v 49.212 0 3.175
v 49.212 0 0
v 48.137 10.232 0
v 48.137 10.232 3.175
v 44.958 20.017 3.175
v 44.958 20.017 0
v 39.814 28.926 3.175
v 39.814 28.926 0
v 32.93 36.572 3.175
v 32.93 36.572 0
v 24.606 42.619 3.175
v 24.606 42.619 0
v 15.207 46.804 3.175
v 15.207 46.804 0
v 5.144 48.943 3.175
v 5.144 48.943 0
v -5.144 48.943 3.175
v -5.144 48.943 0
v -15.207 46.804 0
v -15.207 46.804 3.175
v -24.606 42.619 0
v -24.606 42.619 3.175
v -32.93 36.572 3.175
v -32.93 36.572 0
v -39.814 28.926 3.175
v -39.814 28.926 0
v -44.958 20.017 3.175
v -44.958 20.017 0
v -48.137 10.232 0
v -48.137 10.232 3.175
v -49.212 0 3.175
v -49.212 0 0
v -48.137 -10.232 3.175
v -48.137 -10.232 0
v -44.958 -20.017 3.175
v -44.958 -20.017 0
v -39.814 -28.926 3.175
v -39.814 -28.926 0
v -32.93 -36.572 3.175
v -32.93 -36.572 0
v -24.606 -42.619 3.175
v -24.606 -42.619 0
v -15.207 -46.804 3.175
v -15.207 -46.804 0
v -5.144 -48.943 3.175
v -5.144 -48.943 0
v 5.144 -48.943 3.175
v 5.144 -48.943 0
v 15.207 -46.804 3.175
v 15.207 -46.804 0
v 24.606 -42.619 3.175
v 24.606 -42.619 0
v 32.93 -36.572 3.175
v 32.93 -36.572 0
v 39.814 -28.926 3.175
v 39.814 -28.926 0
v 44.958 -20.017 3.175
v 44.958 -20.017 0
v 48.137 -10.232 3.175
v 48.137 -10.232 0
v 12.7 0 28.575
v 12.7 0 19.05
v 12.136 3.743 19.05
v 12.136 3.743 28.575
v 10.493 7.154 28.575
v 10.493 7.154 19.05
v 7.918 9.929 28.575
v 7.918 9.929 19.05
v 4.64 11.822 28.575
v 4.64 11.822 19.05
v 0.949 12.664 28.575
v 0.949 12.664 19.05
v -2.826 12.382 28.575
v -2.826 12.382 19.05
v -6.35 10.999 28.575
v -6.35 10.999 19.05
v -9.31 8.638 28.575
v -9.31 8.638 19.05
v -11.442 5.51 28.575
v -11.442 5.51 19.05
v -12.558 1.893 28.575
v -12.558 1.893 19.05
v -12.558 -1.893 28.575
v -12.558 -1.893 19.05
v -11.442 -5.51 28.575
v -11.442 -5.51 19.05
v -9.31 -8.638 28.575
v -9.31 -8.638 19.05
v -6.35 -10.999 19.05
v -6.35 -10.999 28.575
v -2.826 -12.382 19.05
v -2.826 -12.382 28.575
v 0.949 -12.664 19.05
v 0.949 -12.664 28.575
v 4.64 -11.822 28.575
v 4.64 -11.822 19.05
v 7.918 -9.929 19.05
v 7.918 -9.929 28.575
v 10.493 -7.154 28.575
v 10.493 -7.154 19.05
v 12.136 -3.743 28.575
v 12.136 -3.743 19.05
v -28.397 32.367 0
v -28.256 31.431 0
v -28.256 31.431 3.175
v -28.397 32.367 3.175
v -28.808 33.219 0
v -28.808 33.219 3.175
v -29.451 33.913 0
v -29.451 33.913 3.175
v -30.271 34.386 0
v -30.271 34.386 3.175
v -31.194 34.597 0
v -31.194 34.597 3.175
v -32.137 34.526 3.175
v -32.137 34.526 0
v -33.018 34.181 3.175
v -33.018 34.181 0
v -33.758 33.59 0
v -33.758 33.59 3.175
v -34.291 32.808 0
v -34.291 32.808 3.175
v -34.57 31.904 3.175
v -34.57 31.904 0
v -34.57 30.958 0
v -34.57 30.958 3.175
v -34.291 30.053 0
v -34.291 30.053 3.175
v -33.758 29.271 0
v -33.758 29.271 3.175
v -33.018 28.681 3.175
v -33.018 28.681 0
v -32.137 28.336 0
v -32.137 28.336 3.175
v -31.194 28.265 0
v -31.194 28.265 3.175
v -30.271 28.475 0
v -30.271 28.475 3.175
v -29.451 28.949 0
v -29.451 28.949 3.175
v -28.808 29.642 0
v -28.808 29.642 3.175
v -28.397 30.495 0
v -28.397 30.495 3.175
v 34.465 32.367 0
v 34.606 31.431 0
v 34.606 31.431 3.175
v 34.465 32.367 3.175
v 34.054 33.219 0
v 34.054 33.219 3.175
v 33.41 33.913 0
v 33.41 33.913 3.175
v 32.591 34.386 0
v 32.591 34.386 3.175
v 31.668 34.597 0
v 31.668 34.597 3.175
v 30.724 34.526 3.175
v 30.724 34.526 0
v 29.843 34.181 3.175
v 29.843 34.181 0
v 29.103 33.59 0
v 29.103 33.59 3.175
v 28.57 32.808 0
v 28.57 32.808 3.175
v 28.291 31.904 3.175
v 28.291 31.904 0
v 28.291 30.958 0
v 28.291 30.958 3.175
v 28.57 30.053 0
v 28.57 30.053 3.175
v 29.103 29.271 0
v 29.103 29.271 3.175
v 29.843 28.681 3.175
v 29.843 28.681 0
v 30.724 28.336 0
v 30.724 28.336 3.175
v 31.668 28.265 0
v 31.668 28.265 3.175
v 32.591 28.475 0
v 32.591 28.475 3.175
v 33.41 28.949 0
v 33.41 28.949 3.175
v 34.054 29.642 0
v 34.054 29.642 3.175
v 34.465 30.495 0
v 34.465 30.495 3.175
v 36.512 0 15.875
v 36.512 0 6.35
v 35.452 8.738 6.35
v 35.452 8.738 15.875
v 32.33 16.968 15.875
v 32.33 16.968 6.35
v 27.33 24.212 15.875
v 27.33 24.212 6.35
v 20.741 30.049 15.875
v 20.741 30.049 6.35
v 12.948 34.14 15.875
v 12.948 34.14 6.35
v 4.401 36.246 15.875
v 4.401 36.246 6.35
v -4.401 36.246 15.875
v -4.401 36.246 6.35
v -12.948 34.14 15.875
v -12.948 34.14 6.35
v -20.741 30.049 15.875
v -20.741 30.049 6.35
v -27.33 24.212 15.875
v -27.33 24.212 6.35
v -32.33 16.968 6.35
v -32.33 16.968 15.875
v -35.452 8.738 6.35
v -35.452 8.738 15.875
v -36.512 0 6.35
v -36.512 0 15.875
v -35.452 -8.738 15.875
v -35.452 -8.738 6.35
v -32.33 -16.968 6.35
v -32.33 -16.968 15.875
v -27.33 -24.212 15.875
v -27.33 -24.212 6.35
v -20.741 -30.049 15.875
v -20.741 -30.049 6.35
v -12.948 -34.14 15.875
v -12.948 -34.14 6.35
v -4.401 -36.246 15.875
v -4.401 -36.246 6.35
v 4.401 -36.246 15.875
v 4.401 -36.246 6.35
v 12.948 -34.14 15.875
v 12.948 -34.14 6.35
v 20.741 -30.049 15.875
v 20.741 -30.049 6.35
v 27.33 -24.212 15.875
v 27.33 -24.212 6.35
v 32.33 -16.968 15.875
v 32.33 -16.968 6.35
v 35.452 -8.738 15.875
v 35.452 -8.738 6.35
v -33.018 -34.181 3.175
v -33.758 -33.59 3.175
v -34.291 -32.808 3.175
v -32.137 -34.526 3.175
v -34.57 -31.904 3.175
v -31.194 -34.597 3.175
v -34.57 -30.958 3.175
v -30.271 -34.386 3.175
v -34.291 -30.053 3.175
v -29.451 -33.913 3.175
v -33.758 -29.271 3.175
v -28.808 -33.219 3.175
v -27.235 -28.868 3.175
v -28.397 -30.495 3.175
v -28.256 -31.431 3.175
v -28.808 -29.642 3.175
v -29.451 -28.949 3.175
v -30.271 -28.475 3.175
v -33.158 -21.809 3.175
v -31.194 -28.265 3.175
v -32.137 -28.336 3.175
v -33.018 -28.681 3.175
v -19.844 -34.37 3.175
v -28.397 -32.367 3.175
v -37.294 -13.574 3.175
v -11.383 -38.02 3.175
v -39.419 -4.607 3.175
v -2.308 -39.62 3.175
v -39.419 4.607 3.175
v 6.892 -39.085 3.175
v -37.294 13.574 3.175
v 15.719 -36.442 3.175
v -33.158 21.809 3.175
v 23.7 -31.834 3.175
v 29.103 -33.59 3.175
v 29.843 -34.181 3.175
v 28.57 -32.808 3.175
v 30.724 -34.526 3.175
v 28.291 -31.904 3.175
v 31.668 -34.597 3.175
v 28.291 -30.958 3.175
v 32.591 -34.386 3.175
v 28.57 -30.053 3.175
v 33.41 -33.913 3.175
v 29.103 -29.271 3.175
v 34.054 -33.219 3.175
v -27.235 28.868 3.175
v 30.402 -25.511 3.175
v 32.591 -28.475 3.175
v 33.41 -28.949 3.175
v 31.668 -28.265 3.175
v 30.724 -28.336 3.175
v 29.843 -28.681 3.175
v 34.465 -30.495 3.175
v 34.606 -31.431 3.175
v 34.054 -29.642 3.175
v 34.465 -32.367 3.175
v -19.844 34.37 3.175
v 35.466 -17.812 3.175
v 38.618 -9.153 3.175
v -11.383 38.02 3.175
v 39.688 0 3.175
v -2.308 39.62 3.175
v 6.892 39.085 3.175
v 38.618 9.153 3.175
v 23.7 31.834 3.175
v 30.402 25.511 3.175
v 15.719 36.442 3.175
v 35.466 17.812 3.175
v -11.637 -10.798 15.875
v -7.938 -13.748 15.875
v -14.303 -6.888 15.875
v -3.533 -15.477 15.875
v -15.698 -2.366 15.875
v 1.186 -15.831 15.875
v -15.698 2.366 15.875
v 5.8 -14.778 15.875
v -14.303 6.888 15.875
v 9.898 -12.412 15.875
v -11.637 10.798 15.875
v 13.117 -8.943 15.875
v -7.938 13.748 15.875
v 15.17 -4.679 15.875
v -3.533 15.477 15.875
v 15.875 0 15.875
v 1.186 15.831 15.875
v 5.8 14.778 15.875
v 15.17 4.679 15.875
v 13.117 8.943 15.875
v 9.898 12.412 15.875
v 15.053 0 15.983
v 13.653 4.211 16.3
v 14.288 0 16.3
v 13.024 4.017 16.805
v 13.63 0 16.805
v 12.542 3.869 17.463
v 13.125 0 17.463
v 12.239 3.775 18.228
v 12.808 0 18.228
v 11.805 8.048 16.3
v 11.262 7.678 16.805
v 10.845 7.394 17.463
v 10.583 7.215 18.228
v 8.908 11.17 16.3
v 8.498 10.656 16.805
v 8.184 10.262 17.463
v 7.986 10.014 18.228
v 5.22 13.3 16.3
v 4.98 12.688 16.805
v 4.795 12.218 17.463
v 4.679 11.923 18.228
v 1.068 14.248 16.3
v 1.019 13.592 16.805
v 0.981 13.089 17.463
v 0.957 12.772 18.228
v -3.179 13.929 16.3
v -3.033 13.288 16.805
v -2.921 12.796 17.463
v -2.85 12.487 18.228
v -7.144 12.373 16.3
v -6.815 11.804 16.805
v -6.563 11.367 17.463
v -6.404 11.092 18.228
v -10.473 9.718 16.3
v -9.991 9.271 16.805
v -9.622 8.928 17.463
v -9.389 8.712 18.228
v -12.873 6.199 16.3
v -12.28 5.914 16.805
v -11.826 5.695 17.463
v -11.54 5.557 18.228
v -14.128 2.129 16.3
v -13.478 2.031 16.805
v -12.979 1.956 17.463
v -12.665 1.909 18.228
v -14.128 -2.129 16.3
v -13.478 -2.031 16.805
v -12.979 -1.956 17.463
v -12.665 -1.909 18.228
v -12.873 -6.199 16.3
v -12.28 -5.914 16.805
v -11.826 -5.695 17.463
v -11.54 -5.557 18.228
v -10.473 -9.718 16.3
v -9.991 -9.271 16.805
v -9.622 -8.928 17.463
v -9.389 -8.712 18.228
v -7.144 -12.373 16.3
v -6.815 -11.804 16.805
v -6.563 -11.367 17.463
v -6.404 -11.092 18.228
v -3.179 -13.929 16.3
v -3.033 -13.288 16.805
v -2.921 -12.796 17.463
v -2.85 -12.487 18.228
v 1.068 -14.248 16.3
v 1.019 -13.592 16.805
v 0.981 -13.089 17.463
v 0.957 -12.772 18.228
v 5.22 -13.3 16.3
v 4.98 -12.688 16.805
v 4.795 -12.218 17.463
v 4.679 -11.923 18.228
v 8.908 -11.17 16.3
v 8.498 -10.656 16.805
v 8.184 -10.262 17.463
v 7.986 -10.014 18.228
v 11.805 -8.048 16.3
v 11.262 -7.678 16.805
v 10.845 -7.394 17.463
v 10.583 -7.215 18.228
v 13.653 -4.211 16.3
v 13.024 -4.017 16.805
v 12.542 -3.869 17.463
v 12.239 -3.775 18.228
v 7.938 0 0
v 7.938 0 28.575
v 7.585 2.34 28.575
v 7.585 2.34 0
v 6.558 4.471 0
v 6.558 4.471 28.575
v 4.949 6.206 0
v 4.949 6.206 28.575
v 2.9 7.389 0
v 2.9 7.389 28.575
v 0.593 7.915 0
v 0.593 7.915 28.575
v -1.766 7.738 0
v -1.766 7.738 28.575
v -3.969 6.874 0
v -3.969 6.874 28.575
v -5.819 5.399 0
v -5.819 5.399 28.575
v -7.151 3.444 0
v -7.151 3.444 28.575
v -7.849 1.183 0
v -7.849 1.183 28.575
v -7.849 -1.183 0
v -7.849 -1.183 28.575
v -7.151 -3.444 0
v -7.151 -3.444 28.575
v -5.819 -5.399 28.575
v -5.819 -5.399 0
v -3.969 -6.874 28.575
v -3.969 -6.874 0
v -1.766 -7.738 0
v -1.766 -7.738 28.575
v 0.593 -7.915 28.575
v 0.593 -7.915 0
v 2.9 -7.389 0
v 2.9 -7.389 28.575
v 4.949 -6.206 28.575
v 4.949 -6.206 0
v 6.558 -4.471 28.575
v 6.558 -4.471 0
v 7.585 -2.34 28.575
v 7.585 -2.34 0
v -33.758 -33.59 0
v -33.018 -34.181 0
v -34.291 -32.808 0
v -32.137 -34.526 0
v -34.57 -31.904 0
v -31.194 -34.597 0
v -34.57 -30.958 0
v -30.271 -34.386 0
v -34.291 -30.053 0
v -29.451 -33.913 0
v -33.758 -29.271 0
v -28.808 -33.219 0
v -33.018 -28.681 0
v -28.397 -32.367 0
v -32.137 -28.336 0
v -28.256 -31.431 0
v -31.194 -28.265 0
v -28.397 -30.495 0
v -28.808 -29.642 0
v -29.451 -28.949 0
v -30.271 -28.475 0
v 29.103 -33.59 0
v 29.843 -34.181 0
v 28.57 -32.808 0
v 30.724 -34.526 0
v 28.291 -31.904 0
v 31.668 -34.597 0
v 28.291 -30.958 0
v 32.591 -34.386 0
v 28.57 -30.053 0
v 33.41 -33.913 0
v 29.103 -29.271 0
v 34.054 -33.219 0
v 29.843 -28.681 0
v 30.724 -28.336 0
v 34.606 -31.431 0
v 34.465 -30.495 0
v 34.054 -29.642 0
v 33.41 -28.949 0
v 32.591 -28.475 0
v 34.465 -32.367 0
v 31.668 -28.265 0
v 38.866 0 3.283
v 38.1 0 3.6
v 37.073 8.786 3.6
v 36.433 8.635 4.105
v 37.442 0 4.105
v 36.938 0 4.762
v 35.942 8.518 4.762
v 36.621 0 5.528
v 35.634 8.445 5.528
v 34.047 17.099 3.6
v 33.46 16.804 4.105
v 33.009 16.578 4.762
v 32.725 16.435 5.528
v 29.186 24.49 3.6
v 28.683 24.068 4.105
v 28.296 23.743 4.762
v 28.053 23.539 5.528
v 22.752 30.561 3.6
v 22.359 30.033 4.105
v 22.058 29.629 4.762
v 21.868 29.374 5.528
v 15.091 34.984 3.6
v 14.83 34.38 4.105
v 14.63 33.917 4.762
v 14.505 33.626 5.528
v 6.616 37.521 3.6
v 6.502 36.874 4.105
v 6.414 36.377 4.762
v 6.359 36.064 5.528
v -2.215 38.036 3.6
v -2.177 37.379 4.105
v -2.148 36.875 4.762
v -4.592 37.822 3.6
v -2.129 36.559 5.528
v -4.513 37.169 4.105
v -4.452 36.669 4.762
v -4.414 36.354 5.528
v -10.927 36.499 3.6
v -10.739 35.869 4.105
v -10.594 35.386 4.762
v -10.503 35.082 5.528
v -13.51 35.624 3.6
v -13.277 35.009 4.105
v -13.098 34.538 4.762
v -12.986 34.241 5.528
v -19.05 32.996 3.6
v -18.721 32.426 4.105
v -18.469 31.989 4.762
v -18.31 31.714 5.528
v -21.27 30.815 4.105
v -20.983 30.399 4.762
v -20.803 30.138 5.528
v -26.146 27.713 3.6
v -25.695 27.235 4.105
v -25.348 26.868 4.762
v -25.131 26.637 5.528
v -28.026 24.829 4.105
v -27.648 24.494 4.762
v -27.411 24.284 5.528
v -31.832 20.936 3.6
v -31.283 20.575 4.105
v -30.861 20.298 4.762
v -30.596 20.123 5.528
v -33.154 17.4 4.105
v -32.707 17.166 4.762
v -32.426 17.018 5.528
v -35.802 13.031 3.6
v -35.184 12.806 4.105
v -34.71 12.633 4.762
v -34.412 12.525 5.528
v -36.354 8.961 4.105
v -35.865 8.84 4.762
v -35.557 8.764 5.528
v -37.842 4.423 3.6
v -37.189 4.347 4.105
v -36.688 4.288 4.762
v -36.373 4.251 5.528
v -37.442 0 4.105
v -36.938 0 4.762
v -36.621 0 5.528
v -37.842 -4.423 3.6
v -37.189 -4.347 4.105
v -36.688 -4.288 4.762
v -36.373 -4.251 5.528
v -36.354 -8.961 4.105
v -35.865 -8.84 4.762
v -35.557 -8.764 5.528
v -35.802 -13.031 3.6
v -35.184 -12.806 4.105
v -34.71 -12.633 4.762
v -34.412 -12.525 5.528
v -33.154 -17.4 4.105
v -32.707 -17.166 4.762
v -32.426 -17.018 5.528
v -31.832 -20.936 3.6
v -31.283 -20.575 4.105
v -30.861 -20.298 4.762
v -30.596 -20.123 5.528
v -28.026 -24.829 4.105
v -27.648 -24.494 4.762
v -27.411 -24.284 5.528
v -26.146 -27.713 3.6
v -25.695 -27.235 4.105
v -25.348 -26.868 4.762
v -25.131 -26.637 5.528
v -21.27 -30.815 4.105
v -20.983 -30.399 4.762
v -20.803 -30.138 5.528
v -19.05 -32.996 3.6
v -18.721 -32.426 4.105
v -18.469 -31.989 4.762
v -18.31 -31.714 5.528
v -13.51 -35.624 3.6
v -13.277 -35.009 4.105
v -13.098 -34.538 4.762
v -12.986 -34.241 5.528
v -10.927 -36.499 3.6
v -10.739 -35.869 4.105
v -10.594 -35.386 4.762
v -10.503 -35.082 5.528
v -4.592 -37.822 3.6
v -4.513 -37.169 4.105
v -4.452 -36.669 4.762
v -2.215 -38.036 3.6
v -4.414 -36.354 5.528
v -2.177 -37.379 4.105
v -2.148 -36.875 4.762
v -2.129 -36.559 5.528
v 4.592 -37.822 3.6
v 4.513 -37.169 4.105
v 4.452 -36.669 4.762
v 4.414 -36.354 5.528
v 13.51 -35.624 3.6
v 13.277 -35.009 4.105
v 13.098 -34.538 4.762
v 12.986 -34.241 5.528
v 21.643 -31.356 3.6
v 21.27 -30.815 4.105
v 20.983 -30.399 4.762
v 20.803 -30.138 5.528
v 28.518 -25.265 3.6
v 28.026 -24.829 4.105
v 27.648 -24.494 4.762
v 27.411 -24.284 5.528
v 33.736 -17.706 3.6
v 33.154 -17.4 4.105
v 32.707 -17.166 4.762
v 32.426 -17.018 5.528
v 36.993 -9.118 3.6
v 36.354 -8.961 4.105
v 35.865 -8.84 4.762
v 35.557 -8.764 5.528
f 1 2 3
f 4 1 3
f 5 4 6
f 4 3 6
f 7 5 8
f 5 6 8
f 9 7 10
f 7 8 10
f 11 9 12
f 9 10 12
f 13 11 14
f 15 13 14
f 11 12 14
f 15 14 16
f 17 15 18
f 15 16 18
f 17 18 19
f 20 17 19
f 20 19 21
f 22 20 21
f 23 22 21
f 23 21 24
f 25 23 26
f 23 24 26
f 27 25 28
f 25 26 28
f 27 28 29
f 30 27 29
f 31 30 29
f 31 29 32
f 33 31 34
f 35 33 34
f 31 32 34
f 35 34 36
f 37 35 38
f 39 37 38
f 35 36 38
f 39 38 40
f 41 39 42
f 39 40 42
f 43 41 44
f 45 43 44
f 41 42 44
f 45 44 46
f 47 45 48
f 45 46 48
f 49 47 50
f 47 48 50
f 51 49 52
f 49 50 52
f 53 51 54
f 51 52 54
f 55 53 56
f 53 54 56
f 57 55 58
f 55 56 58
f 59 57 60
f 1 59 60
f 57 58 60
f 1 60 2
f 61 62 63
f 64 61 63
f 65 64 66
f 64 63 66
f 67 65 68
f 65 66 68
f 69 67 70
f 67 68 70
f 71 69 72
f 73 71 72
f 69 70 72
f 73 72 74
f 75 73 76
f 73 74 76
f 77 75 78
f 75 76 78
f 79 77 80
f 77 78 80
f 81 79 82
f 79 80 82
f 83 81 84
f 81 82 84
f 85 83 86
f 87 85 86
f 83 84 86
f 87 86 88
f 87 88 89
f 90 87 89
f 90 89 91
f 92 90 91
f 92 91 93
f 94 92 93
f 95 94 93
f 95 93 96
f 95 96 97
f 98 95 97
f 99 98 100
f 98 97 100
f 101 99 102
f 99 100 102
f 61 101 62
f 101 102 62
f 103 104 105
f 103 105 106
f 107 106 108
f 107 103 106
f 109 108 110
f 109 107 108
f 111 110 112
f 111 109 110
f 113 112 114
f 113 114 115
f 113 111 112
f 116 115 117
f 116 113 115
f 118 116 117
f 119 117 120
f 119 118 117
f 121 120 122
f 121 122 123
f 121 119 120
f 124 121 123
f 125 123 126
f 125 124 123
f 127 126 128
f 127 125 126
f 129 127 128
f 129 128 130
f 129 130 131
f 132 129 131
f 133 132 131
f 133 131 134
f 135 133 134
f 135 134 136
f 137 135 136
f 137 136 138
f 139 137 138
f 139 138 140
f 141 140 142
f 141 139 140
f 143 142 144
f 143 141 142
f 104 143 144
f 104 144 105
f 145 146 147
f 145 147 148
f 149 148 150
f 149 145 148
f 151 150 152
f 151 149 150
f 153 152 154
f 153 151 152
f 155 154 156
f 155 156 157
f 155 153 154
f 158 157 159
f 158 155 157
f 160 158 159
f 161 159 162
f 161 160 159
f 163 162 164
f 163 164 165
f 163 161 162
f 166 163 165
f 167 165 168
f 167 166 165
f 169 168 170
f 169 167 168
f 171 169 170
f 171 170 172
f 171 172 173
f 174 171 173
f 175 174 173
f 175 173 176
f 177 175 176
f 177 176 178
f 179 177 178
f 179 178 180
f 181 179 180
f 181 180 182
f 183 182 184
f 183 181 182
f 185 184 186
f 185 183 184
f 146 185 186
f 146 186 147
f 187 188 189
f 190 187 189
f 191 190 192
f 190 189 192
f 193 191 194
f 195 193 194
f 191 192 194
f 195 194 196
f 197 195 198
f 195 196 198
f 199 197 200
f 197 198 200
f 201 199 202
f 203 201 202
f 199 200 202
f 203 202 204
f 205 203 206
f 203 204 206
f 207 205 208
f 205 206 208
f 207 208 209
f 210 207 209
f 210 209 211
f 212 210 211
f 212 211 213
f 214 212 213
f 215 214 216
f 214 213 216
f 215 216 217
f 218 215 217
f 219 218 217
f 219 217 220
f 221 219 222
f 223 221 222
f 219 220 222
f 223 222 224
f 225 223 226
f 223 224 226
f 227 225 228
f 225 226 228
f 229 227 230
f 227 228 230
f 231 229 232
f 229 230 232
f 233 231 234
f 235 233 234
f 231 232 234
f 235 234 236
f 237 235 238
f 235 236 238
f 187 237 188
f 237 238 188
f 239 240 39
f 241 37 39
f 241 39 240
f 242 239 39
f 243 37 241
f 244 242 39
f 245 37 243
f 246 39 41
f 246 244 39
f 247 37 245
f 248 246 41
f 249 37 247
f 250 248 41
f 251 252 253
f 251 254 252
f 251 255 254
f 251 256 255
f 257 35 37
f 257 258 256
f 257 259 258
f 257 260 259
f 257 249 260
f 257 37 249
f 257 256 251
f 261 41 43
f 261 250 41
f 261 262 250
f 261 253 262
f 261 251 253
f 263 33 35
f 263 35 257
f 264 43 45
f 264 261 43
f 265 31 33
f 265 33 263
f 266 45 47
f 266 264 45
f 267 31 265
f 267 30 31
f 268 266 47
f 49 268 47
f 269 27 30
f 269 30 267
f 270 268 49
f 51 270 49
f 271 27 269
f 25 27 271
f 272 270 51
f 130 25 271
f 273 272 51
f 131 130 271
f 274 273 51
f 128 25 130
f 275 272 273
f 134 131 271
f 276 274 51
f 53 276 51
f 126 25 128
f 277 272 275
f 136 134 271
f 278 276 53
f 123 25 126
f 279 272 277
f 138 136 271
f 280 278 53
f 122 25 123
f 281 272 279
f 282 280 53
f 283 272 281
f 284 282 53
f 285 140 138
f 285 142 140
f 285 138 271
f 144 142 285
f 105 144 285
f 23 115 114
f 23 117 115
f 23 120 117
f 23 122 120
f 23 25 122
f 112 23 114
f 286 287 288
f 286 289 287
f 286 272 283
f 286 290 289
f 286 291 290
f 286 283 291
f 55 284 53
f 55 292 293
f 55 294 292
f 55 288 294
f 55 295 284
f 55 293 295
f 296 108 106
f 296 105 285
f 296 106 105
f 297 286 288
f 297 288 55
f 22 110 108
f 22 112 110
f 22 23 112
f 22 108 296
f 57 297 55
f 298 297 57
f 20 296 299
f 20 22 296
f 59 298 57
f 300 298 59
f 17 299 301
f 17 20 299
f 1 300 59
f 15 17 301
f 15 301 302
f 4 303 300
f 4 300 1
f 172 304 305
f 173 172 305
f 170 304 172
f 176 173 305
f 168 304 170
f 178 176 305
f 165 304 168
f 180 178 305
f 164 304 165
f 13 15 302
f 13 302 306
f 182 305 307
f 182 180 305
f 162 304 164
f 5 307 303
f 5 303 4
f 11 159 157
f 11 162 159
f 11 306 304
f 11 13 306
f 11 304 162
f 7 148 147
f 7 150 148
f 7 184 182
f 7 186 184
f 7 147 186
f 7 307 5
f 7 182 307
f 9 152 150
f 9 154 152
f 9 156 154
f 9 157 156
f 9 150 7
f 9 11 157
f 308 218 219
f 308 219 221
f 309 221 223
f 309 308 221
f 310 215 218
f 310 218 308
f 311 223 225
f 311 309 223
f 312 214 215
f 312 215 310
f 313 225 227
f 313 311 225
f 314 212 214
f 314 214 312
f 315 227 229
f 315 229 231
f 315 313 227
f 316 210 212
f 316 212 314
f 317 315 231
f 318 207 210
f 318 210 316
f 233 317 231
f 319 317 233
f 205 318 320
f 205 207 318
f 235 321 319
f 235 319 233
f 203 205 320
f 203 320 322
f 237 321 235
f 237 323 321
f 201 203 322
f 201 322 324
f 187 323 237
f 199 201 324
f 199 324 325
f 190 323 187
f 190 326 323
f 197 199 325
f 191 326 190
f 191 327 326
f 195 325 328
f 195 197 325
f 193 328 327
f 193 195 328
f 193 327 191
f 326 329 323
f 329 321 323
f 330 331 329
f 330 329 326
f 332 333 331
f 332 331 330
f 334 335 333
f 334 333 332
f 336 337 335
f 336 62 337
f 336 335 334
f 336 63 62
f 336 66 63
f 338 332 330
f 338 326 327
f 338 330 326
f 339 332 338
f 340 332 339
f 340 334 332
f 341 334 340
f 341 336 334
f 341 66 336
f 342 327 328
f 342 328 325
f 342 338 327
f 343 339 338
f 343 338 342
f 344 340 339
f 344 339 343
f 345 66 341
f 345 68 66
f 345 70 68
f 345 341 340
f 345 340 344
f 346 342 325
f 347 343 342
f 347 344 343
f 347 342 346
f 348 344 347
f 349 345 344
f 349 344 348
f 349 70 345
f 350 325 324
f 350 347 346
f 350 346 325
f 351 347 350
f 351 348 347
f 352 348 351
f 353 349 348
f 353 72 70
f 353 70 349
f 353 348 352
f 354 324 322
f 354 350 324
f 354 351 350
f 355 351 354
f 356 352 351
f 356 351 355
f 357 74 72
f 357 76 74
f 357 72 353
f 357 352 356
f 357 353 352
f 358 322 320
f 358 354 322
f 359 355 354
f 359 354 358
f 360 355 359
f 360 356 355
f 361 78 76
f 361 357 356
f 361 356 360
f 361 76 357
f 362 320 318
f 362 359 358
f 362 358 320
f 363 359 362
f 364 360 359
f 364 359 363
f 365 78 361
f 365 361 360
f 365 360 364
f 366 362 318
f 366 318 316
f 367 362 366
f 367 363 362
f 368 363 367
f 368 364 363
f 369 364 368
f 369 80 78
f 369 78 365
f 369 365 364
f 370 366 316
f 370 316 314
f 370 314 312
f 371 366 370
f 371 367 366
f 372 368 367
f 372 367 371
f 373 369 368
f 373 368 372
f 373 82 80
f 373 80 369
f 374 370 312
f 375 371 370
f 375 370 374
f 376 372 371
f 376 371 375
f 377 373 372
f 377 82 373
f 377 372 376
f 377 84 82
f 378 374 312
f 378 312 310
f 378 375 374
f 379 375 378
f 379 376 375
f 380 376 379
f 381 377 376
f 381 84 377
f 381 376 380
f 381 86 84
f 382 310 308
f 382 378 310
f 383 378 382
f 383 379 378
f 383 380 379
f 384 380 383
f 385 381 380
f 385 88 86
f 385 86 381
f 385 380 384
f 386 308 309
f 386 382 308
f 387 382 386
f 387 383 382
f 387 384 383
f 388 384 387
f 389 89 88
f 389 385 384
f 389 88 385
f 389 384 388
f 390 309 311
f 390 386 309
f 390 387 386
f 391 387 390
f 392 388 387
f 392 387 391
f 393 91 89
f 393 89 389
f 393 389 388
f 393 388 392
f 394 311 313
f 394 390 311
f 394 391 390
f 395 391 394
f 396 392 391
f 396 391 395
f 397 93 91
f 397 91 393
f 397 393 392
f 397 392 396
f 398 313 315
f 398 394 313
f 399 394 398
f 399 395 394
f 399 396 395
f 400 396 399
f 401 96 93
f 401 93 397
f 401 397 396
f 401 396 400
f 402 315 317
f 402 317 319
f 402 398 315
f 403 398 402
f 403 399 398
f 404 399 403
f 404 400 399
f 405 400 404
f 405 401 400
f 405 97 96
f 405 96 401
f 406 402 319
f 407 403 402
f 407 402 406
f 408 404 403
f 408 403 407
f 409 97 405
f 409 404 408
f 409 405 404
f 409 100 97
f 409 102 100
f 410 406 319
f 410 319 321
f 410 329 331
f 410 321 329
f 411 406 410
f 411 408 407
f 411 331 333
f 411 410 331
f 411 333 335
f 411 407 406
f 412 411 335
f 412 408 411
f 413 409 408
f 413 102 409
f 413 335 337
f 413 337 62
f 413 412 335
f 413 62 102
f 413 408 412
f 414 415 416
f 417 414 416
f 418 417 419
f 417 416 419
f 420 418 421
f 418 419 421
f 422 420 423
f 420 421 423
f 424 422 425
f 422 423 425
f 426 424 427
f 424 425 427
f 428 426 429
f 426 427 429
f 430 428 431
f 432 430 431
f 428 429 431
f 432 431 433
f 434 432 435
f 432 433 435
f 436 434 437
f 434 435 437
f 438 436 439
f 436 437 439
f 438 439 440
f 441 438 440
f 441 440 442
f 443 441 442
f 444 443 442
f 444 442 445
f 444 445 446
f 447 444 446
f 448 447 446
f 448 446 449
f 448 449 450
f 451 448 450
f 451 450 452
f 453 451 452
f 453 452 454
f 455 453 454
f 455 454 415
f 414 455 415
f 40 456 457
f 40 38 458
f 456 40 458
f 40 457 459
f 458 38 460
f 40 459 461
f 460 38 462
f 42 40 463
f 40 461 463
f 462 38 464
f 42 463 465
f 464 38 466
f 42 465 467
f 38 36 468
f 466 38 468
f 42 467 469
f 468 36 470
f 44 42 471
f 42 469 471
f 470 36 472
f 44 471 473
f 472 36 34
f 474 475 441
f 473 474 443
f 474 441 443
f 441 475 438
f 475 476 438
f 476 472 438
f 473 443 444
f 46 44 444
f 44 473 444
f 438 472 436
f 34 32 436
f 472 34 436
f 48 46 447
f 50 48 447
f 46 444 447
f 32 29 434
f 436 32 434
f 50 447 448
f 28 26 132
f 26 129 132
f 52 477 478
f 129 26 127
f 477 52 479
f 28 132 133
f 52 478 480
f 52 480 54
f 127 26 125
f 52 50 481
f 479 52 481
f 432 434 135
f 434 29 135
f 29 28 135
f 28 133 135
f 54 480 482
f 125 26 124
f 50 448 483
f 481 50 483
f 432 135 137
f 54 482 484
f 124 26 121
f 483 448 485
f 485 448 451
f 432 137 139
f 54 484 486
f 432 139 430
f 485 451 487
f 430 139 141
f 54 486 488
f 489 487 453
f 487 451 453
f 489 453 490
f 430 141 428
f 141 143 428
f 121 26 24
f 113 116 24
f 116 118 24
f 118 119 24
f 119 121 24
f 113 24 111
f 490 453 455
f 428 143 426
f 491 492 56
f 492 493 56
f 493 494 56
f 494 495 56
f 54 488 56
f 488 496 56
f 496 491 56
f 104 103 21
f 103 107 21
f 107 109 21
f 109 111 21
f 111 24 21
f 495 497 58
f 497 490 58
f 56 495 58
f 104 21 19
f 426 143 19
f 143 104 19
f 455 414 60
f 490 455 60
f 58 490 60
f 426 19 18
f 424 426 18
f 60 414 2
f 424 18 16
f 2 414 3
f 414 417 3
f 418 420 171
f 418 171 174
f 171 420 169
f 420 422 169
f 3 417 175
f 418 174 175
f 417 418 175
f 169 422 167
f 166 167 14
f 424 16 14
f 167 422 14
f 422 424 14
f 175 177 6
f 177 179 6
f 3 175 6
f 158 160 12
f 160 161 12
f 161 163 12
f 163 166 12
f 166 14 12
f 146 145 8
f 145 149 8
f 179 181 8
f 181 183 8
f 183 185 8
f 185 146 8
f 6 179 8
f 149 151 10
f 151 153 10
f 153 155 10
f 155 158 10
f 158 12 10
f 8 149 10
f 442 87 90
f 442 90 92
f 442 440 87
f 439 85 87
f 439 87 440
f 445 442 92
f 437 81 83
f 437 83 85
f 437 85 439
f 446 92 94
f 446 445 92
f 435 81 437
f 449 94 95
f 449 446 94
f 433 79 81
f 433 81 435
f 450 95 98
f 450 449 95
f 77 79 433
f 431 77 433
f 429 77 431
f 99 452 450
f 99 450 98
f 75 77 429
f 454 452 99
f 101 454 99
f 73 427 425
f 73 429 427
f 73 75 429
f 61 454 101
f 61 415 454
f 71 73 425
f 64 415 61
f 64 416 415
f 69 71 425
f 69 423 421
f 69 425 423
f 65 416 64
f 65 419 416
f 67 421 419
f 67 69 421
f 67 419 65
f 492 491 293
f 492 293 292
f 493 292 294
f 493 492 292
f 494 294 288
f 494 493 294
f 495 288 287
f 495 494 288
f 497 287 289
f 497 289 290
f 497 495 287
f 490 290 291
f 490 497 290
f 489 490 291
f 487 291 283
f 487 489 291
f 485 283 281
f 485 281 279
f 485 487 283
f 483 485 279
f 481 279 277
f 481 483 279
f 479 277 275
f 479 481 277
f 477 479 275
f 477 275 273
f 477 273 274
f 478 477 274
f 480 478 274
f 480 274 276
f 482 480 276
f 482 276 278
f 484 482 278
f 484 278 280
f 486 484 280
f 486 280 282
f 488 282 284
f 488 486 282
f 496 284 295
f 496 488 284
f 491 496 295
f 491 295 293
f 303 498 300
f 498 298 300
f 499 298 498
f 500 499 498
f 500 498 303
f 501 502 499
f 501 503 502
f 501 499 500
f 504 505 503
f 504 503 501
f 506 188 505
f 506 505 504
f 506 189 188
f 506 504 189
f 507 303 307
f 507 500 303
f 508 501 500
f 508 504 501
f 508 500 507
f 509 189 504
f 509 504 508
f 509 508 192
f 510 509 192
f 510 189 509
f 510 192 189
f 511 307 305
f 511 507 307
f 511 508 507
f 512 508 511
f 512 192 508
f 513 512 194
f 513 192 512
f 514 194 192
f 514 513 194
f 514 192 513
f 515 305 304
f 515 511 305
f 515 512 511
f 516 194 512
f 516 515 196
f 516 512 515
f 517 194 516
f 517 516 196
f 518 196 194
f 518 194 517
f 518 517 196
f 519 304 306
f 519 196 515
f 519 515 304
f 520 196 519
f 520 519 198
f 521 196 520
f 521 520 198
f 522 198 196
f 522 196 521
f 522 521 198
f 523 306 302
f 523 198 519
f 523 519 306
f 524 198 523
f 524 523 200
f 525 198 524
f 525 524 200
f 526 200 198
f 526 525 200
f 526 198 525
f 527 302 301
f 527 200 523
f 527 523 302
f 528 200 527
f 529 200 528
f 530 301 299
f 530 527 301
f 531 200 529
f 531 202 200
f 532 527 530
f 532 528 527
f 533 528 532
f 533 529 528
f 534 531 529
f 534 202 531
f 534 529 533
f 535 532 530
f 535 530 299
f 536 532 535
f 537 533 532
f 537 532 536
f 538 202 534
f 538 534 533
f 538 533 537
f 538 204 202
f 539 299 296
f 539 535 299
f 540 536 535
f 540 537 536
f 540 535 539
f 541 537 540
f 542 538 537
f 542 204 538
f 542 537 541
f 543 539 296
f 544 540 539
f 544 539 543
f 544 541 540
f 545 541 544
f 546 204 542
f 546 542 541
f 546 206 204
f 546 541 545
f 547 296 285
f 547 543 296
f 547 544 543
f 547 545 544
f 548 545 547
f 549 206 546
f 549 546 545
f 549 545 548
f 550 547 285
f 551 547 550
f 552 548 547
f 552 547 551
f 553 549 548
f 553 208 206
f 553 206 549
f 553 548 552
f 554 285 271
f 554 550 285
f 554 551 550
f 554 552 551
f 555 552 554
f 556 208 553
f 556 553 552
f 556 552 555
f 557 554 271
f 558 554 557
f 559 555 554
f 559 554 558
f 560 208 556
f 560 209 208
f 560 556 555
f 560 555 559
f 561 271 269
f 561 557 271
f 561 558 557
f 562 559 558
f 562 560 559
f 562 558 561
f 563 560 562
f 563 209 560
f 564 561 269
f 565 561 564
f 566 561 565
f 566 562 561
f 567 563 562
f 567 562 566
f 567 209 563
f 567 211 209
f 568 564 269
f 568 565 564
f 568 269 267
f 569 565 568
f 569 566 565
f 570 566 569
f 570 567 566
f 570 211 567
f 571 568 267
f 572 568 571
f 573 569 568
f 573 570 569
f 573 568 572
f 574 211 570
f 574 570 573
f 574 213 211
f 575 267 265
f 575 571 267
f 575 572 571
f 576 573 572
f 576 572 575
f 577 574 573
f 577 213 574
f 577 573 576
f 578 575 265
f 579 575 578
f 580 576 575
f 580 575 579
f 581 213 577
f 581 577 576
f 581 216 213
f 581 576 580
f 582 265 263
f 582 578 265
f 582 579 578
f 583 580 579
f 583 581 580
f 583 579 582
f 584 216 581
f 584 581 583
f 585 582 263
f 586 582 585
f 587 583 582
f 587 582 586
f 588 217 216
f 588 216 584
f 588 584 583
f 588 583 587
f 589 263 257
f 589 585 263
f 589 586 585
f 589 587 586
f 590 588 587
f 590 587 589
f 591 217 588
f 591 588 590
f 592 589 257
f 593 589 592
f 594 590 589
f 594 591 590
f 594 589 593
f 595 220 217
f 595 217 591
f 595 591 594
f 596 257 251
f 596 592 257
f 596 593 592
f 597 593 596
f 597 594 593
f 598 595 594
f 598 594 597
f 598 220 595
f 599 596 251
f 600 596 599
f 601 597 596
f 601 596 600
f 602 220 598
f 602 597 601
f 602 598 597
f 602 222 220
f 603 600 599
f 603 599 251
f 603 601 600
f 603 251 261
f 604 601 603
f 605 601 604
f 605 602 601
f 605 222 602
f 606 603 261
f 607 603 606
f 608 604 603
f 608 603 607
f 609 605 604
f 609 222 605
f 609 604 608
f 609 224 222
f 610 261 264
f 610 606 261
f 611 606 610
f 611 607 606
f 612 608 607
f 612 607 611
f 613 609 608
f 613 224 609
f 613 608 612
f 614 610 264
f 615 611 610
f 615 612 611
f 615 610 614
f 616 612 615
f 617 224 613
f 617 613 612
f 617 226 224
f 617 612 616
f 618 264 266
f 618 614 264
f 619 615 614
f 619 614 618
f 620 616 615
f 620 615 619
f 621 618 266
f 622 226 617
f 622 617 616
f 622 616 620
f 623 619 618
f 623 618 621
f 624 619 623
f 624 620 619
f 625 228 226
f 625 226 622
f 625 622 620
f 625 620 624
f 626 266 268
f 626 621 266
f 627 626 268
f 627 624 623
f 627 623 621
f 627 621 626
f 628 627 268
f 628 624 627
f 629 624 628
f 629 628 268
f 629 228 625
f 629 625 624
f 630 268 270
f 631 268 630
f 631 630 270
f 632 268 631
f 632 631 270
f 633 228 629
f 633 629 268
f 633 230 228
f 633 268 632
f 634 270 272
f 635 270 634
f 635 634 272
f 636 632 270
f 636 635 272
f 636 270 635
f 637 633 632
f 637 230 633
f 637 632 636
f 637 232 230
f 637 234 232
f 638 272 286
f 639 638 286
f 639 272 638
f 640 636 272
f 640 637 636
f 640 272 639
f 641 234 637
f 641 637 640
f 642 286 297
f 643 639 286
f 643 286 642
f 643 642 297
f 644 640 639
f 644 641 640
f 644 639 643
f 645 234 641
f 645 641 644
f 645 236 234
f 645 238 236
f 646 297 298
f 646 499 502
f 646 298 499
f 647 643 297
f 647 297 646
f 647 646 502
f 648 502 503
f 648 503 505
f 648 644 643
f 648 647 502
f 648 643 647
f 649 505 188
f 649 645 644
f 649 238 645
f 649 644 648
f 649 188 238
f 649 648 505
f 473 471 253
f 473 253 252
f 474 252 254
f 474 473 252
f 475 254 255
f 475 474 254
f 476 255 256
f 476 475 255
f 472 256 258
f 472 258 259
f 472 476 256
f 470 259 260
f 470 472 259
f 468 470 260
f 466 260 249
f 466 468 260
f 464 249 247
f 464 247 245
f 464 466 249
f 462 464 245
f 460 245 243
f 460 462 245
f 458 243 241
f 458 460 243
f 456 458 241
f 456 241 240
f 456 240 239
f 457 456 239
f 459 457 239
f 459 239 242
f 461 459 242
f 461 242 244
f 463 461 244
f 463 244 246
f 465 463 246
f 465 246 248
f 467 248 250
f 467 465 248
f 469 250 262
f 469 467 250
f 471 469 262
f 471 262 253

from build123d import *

# Parameters (mm, degrees)
SKETCH1_R           = 49.2125
SKETCH1_R_2         = 3.175
BASE_EXTRUDE_DEPTH  = 3.175
SKETCH2_R           = 36.5125
BOSS_EXTRUDE1_DEPTH = 12.7
SKETCH3_R           = 12.7
BOSS_EXTRUDE2_DEPTH = 12.7
FILLET1_R           = 3.175
SKETCH4_R           = 7.9375
CUT_EXTRUDE1_DEPTH  = 76.23477213


with BuildPart() as part:
    # Sketch1 → Base-Extrude (new body)
    with BuildSketch(Plane.XY):
        Circle(SKETCH1_R)
        with Locations((31.430896424, 31.430896424)):
            Circle(SKETCH1_R_2, mode=Mode.SUBTRACT)
        with Locations((-31.430896424, -31.430896424)):
            Circle(SKETCH1_R_2, mode=Mode.SUBTRACT)
        with Locations((31.430896424, -31.430896424)):
            Circle(SKETCH1_R_2, mode=Mode.SUBTRACT)
        with Locations((-31.430896424, 31.430896424)):
            Circle(SKETCH1_R_2, mode=Mode.SUBTRACT)
    extrude(amount=BASE_EXTRUDE_DEPTH)

    # Sketch2 → Boss-Extrude1 (add)
    with BuildSketch(Plane.XY.offset(3.175)):
        Circle(SKETCH2_R)
    extrude(amount=BOSS_EXTRUDE1_DEPTH)

    # Sketch3 → Boss-Extrude2 (add)
    with BuildSketch(Plane.XY.offset(15.875)):
        Circle(SKETCH3_R)
    extrude(amount=BOSS_EXTRUDE2_DEPTH)

    # Fillet1
    fillet1_edges = [part.edges().sort_by_distance(p)[0] for p in [
        (-36.5125, 0, 3.175),
        (-12.7, 0, 15.875),
    ]]
    fillet(fillet1_edges, radius=FILLET1_R)

    # Sketch4 → Cut-Extrude1 (cut, through all)
    with BuildSketch(Plane.XY.offset(28.575)):
        Circle(SKETCH4_R)
    extrude(amount=-CUT_EXTRUDE1_DEPTH, mode=Mode.SUBTRACT)


solid = part.part
